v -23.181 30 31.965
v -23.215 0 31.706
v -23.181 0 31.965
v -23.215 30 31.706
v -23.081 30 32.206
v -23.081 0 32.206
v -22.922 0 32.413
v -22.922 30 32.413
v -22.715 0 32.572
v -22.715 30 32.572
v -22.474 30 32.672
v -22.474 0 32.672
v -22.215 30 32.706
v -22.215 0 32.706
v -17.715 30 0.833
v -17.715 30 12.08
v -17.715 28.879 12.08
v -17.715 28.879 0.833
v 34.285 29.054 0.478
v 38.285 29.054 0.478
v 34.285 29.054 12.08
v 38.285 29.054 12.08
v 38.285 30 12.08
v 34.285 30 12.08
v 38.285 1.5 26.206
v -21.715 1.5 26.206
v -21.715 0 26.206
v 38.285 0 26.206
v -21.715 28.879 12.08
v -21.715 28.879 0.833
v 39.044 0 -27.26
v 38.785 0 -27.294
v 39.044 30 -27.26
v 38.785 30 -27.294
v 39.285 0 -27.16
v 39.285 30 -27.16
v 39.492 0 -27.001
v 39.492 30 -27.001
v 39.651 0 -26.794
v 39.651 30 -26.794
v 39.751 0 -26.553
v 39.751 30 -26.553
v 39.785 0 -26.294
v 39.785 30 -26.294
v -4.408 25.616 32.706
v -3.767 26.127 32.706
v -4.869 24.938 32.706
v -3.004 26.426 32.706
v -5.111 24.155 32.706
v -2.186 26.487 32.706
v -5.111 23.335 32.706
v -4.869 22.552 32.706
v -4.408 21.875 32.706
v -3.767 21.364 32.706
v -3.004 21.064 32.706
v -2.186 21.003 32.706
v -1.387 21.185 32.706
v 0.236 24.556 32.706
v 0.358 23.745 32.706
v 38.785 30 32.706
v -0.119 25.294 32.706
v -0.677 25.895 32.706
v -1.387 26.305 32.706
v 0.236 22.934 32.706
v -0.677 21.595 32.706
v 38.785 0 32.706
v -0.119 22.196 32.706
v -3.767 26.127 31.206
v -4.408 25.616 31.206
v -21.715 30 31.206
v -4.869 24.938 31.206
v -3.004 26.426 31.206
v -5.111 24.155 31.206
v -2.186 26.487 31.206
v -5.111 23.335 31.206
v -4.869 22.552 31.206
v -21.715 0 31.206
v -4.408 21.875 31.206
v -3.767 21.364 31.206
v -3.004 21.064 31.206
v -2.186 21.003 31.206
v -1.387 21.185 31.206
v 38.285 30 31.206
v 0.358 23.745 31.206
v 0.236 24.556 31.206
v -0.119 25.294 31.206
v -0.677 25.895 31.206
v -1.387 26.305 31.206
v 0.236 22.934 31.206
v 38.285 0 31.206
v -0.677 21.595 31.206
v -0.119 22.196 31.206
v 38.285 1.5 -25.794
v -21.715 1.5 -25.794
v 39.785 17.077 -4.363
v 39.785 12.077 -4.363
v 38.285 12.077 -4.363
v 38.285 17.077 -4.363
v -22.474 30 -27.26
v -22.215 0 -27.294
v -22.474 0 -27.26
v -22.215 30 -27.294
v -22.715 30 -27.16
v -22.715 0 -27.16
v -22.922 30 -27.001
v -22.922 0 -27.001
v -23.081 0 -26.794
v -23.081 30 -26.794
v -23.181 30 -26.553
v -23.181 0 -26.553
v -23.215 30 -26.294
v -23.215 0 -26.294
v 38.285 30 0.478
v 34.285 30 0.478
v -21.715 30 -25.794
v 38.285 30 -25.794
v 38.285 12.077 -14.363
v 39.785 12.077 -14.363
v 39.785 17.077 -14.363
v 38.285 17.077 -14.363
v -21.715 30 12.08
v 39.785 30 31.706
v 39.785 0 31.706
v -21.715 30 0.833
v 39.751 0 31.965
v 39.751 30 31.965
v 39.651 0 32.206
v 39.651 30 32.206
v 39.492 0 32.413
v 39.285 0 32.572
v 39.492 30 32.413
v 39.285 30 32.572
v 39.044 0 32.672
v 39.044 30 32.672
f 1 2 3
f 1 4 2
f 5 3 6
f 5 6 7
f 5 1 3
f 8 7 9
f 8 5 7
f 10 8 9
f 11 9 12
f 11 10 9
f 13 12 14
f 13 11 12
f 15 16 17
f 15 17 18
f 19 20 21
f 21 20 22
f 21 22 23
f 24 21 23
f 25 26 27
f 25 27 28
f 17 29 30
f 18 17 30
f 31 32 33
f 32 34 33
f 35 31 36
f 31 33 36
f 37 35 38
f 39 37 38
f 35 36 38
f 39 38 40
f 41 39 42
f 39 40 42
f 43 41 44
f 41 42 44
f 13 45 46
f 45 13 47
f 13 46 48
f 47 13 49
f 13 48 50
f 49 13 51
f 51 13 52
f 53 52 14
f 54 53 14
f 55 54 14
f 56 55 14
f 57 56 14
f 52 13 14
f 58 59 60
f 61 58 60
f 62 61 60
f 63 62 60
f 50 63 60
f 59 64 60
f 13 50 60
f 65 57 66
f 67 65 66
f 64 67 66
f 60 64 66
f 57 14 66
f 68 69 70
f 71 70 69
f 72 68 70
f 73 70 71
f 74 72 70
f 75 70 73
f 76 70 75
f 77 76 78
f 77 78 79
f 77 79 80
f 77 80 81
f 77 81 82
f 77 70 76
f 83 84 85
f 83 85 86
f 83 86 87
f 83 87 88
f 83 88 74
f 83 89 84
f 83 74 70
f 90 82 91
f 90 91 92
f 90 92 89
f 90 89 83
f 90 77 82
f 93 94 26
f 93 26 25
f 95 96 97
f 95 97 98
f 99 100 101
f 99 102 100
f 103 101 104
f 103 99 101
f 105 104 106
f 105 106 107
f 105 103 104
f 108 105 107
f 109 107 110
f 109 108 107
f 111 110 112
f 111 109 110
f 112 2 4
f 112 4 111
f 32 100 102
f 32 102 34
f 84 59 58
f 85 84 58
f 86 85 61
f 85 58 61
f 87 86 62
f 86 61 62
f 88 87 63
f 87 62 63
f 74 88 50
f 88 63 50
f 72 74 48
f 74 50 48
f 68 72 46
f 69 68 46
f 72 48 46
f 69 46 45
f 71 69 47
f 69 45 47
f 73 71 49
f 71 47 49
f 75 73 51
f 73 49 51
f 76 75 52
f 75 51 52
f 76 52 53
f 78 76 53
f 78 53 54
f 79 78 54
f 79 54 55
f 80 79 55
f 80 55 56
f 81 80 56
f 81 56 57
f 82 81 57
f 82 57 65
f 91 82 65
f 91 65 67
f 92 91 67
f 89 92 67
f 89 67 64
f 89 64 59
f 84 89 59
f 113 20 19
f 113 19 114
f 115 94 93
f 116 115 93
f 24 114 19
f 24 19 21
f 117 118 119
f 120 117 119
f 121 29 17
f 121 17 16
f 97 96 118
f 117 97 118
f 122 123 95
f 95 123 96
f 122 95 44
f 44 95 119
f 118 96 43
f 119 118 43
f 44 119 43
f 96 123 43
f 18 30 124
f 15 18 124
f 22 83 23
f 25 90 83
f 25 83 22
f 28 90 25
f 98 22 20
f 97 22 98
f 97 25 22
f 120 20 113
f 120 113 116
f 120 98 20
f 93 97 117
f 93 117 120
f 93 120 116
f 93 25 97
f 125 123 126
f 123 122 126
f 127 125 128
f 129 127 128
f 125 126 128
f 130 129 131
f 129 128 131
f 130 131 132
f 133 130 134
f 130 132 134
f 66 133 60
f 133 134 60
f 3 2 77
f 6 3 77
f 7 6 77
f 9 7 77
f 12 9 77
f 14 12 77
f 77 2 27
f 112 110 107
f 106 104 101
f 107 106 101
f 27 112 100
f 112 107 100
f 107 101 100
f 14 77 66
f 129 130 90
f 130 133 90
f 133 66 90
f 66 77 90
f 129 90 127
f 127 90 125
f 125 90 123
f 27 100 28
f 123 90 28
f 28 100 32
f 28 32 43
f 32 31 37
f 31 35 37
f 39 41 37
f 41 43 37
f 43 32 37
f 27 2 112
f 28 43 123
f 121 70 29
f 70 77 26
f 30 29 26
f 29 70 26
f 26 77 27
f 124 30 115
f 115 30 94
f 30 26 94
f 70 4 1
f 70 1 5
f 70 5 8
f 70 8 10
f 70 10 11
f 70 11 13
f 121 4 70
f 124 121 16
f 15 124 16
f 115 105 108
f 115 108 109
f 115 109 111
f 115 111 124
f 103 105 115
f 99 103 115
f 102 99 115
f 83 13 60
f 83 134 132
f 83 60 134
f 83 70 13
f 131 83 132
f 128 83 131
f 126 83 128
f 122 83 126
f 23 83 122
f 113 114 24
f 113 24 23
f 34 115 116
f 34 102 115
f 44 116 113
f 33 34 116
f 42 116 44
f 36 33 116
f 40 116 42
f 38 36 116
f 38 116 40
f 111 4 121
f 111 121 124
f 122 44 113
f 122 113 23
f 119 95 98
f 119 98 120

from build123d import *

# Parameters (mm, degrees)
SKETCH1_W               = 63
SKETCH1_H               = 60
BOSS_EXTRUDE1_DEPTH     = 30
SKETCH2_W               = 60
SKETCH2_H               = 57
CUT_EXTRUDE1_DEPTH      = 44
FILLET5_R               = 1
FILLET6_R               = 1
SKETCH4_W               = 11.2479448
SKETCH4_H               = 1.120832932
BOSS_EXTRUDE2_DEPTH     = 4
SKETCH7_W               = 11.602367515
SKETCH7_H               = 0.946433532
BOSS_EXTRUDE3_DEPTH     = 4
SKETCH13_W              = 60
SKETCH13_H              = 1.5
BOSS_EXTRUDE4_DEPTH     = 52
SKETCH8_R               = 2.75
CUT_EXTRUDE2_DEPTH      = 15
CUT_EXTRUDE2_DEPTH_BACK = 20
SKETCH18_W              = 10
SKETCH18_H              = 5
CUT_EXTRUDE4_DEPTH      = 15


with BuildPart() as part:
    # Sketch1 → Boss-Extrude1 (new body)
    with BuildSketch(Plane(origin=(0, 0, 0), x_dir=(1, 0, 0), z_dir=(0, 1, 0))):
        with Locations((8.284946237, -2.70609319)):
            Rectangle(SKETCH1_W, SKETCH1_H)
    extrude(amount=BOSS_EXTRUDE1_DEPTH)

    # Sketch2 → Cut-Extrude1 (cut)
    with BuildSketch(Plane(origin=(0, 0, 0), x_dir=(1, 0, 0), z_dir=(0, 1, 0))):
        with Locations((8.284946237, -2.70609319)):
            Rectangle(SKETCH2_W, SKETCH2_H)
    extrude(amount=CUT_EXTRUDE1_DEPTH, mode=Mode.SUBTRACT)

    # Fillet5
    fillet5_edges = [part.edges().sort_by_distance(p)[0] for p in [
        (39.784946237, 15, -27.29390681),
    ]]
    fillet(fillet5_edges, radius=FILLET5_R)

    # Fillet6
    fillet6_edges = [part.edges().sort_by_distance(p)[0] for p in [
        (-23.215053763, 15, -27.29390681),
        (39.784946237, 15, 32.70609319),
        (-23.215053763, 15, 32.70609319),
    ]]
    fillet(fillet6_edges, radius=FILLET6_R)

    # Sketch4 → Boss-Extrude2 (add)
    with BuildSketch(Plane(origin=(-21.715053763, 0, 0), x_dir=(0, 0, -1), z_dir=(1, 0, 0))):
        with Locations((-6.456507936, 29.439583534)):
            Rectangle(SKETCH4_W, SKETCH4_H)
    extrude(amount=BOSS_EXTRUDE2_DEPTH)

    # Sketch7 → Boss-Extrude3 (add)
    with BuildSketch(Plane.ZY.offset(-38.284946237)):
        with Locations((6.279296579, 29.526783234)):
            Rectangle(SKETCH7_W, SKETCH7_H)
    extrude(amount=BOSS_EXTRUDE3_DEPTH)

    # Sketch13 → Boss-Extrude4 (add)
    with BuildSketch(Plane.XY.offset(-25.79390681)):
        with Locations((8.284946237, 0.75)):
            Rectangle(SKETCH13_W, SKETCH13_H)
    extrude(amount=BOSS_EXTRUDE4_DEPTH)

    # Sketch8 → Cut-Extrude2 (cut, two sides)
    with BuildSketch(Plane.XY.offset(32.70609319)) as cut_extrude2_sk:
        with Locations((-2.391644106, 23.745075348)):
            Circle(SKETCH8_R)
    extrude(amount=CUT_EXTRUDE2_DEPTH, mode=Mode.SUBTRACT)
    extrude(cut_extrude2_sk.sketch, amount=-CUT_EXTRUDE2_DEPTH_BACK, mode=Mode.SUBTRACT)

    # Sketch18 → Cut-Extrude4 (cut)
    with BuildSketch(Plane(origin=(39.784946237, 0, 0), x_dir=(0, 0, -1), z_dir=(1, 0, 0))):
        with Locations((9.363418395, 14.577492713)):
            Rectangle(SKETCH18_W, SKETCH18_H)
    extrude(amount=-CUT_EXTRUDE4_DEPTH, mode=Mode.SUBTRACT)


solid = part.part
